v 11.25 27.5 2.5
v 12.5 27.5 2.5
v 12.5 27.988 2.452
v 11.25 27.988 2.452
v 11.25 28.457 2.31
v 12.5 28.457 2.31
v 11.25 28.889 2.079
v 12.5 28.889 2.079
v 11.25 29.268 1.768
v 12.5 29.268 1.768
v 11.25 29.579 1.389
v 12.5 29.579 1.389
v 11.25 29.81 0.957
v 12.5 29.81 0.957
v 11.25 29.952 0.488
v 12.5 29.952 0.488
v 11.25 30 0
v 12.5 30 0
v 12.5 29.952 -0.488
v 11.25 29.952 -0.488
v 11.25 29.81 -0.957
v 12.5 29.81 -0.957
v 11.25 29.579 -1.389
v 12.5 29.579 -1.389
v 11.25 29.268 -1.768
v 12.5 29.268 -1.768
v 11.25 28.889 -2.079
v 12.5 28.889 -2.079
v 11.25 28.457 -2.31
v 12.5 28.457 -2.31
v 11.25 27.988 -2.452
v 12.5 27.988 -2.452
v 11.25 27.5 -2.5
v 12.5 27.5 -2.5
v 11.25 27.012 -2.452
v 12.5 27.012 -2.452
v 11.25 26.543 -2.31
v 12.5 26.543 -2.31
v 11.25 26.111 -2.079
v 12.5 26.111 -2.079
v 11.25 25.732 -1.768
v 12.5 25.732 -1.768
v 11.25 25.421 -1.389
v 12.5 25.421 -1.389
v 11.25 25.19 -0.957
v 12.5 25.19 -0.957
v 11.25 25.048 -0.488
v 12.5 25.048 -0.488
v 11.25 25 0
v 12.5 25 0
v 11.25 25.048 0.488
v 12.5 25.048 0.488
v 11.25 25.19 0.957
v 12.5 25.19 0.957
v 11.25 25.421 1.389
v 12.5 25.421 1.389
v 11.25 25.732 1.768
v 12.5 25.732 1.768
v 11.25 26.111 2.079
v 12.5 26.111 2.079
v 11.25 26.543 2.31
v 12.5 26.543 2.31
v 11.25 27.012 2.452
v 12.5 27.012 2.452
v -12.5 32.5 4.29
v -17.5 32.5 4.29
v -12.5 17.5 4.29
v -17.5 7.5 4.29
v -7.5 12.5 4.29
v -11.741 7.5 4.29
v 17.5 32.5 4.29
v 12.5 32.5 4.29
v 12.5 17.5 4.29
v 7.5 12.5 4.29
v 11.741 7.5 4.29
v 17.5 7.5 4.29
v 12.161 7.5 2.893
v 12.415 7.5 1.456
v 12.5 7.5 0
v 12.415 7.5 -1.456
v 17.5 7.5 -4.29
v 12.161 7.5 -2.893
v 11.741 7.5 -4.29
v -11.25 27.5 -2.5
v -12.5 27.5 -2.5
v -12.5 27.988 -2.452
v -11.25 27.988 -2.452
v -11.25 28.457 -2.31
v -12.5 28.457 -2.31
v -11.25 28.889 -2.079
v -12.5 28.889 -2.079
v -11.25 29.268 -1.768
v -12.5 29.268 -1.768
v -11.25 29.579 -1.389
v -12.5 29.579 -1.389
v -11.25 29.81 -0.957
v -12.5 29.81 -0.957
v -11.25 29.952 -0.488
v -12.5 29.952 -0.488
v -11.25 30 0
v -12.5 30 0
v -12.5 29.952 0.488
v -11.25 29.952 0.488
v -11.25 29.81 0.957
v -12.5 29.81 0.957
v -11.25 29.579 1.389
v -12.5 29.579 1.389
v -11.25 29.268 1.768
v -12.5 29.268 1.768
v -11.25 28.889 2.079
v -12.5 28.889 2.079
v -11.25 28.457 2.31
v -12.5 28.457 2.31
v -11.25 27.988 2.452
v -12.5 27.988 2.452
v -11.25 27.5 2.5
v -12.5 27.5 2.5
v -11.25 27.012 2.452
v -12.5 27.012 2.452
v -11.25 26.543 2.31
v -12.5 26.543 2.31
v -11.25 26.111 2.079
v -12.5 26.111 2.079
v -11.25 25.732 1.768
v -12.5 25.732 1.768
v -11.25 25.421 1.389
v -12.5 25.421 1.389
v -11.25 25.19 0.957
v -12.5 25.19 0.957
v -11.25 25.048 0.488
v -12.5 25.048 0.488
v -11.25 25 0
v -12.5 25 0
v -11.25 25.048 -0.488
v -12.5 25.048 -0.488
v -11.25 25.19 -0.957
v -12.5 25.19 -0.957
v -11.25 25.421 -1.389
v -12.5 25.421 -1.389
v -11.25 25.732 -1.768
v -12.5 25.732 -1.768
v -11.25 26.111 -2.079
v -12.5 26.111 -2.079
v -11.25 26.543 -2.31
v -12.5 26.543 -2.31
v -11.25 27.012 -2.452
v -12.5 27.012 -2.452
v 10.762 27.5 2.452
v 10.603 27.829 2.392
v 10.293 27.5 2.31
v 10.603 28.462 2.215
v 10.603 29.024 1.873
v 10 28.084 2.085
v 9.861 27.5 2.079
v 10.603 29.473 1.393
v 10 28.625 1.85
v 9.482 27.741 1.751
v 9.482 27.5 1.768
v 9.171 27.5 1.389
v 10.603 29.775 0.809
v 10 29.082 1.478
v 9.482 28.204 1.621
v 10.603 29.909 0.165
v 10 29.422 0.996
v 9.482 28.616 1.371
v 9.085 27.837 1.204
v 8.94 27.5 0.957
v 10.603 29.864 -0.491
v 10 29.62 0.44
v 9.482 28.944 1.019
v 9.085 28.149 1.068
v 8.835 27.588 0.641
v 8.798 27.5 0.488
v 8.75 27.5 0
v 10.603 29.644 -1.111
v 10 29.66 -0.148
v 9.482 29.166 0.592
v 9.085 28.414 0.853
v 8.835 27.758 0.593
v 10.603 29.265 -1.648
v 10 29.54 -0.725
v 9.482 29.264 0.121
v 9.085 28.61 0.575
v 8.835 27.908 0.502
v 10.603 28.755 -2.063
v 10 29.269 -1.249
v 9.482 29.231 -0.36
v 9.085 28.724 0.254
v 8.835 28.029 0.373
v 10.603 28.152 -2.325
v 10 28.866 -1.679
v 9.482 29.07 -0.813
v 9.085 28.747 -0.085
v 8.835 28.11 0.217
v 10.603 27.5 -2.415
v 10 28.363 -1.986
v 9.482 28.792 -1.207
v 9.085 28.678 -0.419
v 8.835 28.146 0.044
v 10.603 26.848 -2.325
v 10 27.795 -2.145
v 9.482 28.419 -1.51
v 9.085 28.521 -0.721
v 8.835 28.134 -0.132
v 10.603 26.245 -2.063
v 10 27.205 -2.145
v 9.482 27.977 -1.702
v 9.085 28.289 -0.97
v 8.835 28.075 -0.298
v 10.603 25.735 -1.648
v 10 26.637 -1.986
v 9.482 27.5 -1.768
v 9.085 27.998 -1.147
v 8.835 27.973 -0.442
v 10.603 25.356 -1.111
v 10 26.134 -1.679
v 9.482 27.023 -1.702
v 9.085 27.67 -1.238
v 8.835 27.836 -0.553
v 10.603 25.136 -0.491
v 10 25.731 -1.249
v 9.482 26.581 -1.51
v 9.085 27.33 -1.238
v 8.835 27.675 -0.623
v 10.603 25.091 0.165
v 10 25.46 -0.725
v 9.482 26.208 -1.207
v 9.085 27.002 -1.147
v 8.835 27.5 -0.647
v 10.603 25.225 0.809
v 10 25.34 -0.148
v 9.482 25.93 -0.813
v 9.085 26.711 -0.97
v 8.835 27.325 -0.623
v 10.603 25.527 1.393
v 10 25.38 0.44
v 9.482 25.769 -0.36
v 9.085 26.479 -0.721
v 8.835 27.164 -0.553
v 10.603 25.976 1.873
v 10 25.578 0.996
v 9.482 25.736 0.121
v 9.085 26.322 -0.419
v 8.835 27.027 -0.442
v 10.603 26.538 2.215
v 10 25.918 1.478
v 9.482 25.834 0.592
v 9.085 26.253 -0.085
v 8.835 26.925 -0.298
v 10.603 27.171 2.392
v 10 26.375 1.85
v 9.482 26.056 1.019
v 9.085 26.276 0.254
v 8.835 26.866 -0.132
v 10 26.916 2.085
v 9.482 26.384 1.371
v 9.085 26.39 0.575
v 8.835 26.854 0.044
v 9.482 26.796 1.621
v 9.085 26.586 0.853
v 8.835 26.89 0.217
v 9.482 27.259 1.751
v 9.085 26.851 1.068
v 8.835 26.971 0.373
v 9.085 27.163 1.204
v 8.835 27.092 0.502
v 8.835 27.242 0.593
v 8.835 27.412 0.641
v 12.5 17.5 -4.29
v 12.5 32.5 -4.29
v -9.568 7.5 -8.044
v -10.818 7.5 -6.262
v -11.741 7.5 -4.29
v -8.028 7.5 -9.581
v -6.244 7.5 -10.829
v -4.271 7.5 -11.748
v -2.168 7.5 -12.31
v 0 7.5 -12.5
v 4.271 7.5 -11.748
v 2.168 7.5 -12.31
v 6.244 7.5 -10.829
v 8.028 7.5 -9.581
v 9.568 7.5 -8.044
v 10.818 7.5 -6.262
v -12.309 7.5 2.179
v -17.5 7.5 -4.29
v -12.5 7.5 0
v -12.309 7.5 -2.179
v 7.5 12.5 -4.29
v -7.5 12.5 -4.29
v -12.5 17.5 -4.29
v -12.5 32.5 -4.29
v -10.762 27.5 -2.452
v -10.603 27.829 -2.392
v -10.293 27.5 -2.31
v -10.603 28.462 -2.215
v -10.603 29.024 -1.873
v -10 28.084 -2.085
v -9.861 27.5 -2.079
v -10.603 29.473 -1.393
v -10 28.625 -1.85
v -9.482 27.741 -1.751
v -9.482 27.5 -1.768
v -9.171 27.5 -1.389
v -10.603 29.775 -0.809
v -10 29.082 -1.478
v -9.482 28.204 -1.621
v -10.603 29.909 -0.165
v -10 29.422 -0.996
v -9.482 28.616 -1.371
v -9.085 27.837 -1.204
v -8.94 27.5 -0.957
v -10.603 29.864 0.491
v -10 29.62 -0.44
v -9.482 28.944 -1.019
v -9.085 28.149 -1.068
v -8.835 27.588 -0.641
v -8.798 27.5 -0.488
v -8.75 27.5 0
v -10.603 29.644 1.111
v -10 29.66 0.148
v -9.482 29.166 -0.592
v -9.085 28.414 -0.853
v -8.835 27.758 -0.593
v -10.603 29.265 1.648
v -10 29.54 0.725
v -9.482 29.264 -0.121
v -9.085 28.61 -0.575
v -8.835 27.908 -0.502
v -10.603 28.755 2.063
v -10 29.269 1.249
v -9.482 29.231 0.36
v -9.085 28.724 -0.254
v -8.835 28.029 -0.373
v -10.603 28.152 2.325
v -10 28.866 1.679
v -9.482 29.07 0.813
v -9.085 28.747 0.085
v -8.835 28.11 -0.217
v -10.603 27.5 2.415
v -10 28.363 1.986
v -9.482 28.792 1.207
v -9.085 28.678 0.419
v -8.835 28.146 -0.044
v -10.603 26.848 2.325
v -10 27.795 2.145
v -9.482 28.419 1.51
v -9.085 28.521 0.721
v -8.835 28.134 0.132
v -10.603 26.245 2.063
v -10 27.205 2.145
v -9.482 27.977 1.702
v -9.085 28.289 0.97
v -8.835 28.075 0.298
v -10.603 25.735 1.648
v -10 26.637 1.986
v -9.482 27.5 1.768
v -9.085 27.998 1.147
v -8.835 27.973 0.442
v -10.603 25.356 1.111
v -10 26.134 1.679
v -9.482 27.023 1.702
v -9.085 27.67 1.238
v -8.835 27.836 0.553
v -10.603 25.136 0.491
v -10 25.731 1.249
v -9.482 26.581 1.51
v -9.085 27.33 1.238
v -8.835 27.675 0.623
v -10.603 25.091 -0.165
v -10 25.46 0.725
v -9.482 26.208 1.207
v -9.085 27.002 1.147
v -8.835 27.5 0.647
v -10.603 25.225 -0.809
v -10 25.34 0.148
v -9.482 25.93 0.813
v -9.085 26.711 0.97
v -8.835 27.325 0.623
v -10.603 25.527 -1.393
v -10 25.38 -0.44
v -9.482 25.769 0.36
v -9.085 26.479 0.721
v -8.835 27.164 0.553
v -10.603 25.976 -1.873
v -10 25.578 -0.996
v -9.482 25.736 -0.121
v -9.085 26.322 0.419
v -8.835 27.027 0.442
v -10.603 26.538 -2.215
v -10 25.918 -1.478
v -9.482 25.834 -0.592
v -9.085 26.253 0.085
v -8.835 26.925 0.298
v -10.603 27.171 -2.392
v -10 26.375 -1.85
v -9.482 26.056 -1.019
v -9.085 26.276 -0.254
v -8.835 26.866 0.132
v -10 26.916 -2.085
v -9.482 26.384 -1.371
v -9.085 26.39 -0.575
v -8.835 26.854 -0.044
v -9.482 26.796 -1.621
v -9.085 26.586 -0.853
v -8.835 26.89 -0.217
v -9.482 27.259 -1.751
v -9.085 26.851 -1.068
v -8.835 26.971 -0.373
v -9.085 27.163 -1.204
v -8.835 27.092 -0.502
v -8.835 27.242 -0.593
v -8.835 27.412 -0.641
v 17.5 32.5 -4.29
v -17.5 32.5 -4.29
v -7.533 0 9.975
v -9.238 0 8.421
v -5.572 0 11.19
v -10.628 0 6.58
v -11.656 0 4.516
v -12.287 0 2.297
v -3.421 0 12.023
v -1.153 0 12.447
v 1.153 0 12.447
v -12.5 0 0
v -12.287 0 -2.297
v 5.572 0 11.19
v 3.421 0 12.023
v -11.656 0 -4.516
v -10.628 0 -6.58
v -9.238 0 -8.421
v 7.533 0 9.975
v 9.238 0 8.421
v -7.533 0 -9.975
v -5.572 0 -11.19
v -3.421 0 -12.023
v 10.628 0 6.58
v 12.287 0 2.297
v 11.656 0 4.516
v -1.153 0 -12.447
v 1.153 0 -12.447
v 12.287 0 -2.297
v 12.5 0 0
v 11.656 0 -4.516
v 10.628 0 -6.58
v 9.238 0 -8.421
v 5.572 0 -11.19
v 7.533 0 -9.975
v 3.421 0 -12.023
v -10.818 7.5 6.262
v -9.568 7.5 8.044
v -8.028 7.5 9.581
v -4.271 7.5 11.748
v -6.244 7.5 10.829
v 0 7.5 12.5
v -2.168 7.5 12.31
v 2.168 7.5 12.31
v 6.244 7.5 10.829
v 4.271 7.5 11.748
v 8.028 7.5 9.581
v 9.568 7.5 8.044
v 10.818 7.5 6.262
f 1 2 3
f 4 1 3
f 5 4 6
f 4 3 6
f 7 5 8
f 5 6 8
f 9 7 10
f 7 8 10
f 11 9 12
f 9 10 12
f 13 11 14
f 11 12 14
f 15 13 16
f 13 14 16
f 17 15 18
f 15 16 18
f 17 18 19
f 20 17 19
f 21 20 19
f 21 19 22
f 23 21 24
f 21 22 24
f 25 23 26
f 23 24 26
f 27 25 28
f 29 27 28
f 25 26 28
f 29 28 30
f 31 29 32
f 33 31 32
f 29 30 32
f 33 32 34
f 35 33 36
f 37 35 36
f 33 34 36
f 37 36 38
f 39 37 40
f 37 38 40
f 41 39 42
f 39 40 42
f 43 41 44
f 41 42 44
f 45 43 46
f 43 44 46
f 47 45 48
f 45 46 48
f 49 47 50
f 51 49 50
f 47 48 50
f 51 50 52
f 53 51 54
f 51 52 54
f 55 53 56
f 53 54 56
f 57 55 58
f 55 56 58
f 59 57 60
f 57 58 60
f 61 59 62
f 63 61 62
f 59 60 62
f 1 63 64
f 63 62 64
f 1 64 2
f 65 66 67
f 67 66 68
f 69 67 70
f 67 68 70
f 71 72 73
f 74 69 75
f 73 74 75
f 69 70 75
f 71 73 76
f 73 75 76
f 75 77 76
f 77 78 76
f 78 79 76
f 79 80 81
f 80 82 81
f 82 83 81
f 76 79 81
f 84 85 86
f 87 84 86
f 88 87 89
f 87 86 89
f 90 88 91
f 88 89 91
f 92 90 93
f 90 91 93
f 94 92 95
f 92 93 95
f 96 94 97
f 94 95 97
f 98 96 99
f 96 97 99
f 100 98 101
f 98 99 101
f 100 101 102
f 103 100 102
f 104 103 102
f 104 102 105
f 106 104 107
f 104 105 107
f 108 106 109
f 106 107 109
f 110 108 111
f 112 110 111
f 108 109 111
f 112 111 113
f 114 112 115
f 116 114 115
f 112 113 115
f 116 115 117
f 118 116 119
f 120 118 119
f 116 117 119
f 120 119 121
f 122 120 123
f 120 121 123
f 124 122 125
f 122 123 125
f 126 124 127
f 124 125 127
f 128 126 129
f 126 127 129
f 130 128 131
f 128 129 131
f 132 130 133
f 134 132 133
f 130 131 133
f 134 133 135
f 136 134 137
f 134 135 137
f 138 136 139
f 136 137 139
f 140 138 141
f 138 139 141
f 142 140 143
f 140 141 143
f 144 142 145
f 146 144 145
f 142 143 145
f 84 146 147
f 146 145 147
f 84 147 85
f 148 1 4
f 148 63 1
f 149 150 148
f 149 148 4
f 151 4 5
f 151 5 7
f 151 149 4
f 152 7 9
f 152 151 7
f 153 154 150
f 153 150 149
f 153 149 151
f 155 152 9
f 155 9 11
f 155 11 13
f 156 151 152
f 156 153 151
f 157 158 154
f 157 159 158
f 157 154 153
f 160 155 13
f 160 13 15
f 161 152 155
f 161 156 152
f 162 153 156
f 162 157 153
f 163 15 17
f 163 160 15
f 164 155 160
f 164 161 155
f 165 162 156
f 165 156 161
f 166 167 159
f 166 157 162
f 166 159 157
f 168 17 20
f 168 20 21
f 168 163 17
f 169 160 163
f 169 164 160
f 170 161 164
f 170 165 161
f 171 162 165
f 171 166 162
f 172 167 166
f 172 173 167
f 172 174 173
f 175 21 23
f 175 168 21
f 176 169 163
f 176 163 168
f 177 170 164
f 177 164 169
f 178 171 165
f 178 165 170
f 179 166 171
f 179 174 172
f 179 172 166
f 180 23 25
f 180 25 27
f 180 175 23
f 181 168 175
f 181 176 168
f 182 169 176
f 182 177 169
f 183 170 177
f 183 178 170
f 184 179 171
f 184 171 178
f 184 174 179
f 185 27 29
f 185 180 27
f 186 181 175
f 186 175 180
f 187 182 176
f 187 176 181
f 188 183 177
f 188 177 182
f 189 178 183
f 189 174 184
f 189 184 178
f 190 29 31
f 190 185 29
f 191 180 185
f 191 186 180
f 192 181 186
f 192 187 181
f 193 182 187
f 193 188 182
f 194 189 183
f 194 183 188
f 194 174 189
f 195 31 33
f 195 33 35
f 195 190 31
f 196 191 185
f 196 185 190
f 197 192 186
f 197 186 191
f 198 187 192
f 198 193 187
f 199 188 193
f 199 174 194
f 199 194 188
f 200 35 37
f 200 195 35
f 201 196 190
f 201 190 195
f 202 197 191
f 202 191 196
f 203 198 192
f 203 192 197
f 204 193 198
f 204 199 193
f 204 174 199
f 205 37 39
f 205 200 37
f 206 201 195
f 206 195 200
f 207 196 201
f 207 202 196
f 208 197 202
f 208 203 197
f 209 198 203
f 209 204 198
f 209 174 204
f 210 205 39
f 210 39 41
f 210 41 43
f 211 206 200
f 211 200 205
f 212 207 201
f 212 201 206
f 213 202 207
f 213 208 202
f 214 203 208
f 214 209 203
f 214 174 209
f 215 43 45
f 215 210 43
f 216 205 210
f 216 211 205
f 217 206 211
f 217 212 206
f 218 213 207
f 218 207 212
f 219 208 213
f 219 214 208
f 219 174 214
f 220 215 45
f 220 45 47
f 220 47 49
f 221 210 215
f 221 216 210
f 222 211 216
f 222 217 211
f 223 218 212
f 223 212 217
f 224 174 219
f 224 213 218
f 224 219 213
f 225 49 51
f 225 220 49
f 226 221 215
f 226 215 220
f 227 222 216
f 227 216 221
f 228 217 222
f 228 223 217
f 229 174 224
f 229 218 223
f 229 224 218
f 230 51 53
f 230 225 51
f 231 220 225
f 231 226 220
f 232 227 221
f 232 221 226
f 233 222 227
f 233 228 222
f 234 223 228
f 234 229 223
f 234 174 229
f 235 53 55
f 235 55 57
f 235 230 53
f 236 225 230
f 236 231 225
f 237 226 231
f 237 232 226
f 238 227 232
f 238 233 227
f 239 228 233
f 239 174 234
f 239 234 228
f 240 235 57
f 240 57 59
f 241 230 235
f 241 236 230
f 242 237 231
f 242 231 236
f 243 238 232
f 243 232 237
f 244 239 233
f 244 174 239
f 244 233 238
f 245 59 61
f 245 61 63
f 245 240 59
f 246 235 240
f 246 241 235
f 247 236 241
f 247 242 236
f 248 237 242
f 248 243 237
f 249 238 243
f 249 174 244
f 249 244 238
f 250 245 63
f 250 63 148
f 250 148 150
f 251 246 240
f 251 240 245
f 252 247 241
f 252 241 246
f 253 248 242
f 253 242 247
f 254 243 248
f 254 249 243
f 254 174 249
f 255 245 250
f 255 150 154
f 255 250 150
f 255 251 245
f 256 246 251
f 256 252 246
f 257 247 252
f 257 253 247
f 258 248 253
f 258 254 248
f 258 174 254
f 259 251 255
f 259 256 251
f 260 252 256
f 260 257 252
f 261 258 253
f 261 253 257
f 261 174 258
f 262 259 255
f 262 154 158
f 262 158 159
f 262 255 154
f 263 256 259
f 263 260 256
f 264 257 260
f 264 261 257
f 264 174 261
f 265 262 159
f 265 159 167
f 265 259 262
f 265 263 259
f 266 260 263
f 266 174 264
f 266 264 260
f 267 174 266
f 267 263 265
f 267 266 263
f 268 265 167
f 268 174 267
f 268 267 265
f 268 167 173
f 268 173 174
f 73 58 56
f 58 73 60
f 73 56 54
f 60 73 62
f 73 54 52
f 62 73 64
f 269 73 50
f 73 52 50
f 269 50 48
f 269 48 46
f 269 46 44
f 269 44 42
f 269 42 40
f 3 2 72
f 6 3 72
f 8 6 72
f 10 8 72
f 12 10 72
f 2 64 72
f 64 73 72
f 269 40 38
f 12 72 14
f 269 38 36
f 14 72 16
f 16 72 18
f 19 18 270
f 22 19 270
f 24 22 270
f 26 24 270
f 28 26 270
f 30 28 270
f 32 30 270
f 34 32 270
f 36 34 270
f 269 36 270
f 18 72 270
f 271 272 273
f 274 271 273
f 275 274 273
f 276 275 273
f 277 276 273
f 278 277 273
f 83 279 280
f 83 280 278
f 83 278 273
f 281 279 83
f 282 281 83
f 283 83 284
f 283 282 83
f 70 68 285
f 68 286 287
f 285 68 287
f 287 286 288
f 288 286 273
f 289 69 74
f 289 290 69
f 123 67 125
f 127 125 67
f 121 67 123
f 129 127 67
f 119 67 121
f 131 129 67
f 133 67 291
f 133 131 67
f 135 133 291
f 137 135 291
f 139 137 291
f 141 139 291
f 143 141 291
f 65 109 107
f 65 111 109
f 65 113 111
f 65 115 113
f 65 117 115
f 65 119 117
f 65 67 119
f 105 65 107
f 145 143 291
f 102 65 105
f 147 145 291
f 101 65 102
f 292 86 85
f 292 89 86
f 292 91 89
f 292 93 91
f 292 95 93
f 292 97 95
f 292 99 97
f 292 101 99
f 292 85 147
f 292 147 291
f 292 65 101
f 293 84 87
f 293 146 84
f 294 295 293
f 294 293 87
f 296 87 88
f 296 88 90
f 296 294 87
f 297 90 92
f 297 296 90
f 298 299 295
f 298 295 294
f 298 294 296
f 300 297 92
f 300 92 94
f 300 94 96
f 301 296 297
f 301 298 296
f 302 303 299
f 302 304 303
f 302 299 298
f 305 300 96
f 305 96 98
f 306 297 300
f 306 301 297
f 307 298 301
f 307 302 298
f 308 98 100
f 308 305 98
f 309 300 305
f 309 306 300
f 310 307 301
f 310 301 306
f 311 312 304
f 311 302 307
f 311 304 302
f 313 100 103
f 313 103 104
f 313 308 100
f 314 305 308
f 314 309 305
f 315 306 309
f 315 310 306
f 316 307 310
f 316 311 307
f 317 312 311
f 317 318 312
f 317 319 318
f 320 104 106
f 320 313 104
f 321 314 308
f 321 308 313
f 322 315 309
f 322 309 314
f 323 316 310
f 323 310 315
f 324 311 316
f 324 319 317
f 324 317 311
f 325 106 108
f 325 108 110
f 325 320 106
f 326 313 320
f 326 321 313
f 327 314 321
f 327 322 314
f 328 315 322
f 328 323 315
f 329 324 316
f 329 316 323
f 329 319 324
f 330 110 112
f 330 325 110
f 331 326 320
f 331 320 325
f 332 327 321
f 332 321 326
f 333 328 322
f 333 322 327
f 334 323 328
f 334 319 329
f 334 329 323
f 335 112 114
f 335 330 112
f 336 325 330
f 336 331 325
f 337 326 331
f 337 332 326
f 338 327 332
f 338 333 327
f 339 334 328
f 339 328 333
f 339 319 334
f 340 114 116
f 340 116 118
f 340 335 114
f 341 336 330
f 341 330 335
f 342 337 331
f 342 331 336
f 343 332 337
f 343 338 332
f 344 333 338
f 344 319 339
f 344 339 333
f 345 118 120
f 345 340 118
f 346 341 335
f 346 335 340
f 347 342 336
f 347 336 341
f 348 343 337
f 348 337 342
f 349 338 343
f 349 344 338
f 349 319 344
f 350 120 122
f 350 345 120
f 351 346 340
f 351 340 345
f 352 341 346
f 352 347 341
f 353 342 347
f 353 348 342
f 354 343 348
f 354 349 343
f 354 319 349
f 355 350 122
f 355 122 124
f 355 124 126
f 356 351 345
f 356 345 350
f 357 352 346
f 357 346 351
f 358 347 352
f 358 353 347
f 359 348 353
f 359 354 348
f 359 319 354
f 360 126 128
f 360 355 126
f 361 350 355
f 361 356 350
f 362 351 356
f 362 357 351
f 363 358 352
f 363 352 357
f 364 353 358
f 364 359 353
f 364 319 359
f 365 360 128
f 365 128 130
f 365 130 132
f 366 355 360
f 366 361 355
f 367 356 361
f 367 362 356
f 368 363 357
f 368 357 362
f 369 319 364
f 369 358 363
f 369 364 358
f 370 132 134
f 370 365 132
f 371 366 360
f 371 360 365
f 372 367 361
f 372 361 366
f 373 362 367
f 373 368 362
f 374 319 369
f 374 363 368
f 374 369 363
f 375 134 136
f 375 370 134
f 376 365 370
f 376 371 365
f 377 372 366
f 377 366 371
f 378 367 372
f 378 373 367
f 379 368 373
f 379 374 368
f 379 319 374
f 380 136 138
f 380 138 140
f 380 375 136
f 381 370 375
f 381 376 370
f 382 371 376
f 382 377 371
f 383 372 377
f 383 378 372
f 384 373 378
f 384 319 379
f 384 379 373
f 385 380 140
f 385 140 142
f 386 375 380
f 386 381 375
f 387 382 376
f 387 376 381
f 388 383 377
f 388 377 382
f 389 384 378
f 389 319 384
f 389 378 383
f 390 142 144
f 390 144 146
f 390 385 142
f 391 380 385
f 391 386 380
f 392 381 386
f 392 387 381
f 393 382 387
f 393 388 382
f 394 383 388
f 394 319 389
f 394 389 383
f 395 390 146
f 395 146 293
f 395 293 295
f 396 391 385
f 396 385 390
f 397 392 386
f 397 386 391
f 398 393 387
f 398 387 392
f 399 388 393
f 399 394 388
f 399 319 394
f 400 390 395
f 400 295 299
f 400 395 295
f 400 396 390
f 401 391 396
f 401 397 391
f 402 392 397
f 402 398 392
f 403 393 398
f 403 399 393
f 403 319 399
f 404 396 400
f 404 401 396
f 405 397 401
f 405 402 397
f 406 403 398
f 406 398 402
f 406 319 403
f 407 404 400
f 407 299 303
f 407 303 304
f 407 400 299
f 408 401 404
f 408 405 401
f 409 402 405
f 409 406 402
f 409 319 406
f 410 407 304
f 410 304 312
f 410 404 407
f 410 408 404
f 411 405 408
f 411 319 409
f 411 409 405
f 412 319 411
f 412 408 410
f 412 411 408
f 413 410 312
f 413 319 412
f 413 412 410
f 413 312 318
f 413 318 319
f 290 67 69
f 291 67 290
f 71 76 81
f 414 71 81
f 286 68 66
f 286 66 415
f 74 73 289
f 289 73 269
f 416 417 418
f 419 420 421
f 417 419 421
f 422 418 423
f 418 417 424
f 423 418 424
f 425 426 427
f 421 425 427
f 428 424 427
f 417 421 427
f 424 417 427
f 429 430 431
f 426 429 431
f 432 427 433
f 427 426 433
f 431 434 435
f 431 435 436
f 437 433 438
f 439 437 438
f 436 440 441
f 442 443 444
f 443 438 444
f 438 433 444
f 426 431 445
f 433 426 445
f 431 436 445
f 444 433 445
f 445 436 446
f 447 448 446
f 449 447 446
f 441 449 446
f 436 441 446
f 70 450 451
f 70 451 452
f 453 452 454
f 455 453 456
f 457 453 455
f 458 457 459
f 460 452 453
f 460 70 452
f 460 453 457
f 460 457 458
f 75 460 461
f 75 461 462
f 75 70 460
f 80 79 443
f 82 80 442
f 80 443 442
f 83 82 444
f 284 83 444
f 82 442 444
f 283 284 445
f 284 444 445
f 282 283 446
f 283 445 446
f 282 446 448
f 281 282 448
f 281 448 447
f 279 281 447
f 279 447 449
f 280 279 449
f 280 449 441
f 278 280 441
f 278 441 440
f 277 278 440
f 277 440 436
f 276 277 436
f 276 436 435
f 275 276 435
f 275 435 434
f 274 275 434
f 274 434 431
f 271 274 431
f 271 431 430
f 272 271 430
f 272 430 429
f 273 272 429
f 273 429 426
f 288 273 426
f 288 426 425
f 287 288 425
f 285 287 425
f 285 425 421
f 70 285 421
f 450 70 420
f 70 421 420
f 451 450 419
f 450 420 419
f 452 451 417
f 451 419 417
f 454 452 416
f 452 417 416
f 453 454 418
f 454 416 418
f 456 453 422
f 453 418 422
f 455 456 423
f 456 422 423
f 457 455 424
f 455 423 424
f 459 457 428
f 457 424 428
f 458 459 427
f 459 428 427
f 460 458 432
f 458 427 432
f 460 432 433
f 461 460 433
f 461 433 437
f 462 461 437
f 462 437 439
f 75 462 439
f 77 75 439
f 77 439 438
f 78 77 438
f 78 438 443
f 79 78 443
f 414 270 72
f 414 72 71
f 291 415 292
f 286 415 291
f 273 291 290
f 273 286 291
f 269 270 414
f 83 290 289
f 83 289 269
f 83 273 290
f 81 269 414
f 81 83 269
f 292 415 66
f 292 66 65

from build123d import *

# Parameters (mm, degrees)
SKETCH1_R           = 12.5
BOSS_EXTRUDE1_DEPTH = 7.5
SKETCH2_W           = 35
SKETCH2_H           = 8.580767914
BOSS_EXTRUDE2_DEPTH = 25
SKETCH3_W           = 25
SKETCH3_H           = 8.580767914
CUT_EXTRUDE1_DEPTH  = 20
SKETCH4_R           = 2.5
BOSS_EXTRUDE3_DEPTH = 3.75
SKETCH5_R           = 2.5
BOSS_EXTRUDE4_DEPTH = 3.75
FILLET2_R           = 2.5
FILLET3_R           = 2.5
CHAMFER1_SIZE       = 5
CHAMFER2_SIZE       = 5


with BuildPart() as part:
    # Sketch1 → Boss-Extrude1 (new body)
    with BuildSketch(Plane(origin=(0, 0, 0), x_dir=(1, 0, 0), z_dir=(0, 1, 0))):
        Circle(SKETCH1_R)
    extrude(amount=BOSS_EXTRUDE1_DEPTH)

    # Sketch2 → Boss-Extrude2 (add)
    with BuildSketch(Plane(origin=(0, 7.5, 0), x_dir=(1, 0, 0), z_dir=(0, 1, 0))):
        Rectangle(SKETCH2_W, SKETCH2_H)
    extrude(amount=BOSS_EXTRUDE2_DEPTH)

    # Sketch3 → Cut-Extrude1 (cut)
    with BuildSketch(Plane(origin=(0, 32.5, 0), x_dir=(1, 0, 0), z_dir=(0, 1, 0))):
        Rectangle(SKETCH3_W, SKETCH3_H)
    extrude(amount=-CUT_EXTRUDE1_DEPTH, mode=Mode.SUBTRACT)

    # Sketch4 → Boss-Extrude3 (add)
    with BuildSketch(Plane(origin=(-12.5, 0, 0), x_dir=(0, 0, -1), z_dir=(1, 0, 0))):
        with Locations((0, 27.5)):
            Circle(SKETCH4_R)
    extrude(amount=BOSS_EXTRUDE3_DEPTH)

    # Sketch5 → Boss-Extrude4 (add)
    with BuildSketch(Plane.ZY.offset(-12.5)):
        with Locations((0, 27.5)):
            Circle(SKETCH5_R)
    extrude(amount=BOSS_EXTRUDE4_DEPTH)

    # Fillet2
    fillet2_edges = [part.edges().sort_by_distance(p)[0] for p in [
        (-8.75, 27.5, 2.5),
    ]]
    fillet(fillet2_edges, radius=FILLET2_R)

    # Fillet3
    fillet3_edges = [part.edges().sort_by_distance(p)[0] for p in [
        (8.75, 27.5, -2.5),
    ]]
    fillet(fillet3_edges, radius=FILLET3_R)

    # Chamfer1
    chamfer1_edges = [part.edges().sort_by_distance(p)[0] for p in [
        (-12.5, 12.5, 0),
    ]]
    chamfer(chamfer1_edges, length=CHAMFER1_SIZE)

    # Chamfer2
    chamfer2_edges = [part.edges().sort_by_distance(p)[0] for p in [
        (12.5, 12.5, 0),
    ]]
    chamfer(chamfer2_edges, length=CHAMFER2_SIZE)


solid = part.part
